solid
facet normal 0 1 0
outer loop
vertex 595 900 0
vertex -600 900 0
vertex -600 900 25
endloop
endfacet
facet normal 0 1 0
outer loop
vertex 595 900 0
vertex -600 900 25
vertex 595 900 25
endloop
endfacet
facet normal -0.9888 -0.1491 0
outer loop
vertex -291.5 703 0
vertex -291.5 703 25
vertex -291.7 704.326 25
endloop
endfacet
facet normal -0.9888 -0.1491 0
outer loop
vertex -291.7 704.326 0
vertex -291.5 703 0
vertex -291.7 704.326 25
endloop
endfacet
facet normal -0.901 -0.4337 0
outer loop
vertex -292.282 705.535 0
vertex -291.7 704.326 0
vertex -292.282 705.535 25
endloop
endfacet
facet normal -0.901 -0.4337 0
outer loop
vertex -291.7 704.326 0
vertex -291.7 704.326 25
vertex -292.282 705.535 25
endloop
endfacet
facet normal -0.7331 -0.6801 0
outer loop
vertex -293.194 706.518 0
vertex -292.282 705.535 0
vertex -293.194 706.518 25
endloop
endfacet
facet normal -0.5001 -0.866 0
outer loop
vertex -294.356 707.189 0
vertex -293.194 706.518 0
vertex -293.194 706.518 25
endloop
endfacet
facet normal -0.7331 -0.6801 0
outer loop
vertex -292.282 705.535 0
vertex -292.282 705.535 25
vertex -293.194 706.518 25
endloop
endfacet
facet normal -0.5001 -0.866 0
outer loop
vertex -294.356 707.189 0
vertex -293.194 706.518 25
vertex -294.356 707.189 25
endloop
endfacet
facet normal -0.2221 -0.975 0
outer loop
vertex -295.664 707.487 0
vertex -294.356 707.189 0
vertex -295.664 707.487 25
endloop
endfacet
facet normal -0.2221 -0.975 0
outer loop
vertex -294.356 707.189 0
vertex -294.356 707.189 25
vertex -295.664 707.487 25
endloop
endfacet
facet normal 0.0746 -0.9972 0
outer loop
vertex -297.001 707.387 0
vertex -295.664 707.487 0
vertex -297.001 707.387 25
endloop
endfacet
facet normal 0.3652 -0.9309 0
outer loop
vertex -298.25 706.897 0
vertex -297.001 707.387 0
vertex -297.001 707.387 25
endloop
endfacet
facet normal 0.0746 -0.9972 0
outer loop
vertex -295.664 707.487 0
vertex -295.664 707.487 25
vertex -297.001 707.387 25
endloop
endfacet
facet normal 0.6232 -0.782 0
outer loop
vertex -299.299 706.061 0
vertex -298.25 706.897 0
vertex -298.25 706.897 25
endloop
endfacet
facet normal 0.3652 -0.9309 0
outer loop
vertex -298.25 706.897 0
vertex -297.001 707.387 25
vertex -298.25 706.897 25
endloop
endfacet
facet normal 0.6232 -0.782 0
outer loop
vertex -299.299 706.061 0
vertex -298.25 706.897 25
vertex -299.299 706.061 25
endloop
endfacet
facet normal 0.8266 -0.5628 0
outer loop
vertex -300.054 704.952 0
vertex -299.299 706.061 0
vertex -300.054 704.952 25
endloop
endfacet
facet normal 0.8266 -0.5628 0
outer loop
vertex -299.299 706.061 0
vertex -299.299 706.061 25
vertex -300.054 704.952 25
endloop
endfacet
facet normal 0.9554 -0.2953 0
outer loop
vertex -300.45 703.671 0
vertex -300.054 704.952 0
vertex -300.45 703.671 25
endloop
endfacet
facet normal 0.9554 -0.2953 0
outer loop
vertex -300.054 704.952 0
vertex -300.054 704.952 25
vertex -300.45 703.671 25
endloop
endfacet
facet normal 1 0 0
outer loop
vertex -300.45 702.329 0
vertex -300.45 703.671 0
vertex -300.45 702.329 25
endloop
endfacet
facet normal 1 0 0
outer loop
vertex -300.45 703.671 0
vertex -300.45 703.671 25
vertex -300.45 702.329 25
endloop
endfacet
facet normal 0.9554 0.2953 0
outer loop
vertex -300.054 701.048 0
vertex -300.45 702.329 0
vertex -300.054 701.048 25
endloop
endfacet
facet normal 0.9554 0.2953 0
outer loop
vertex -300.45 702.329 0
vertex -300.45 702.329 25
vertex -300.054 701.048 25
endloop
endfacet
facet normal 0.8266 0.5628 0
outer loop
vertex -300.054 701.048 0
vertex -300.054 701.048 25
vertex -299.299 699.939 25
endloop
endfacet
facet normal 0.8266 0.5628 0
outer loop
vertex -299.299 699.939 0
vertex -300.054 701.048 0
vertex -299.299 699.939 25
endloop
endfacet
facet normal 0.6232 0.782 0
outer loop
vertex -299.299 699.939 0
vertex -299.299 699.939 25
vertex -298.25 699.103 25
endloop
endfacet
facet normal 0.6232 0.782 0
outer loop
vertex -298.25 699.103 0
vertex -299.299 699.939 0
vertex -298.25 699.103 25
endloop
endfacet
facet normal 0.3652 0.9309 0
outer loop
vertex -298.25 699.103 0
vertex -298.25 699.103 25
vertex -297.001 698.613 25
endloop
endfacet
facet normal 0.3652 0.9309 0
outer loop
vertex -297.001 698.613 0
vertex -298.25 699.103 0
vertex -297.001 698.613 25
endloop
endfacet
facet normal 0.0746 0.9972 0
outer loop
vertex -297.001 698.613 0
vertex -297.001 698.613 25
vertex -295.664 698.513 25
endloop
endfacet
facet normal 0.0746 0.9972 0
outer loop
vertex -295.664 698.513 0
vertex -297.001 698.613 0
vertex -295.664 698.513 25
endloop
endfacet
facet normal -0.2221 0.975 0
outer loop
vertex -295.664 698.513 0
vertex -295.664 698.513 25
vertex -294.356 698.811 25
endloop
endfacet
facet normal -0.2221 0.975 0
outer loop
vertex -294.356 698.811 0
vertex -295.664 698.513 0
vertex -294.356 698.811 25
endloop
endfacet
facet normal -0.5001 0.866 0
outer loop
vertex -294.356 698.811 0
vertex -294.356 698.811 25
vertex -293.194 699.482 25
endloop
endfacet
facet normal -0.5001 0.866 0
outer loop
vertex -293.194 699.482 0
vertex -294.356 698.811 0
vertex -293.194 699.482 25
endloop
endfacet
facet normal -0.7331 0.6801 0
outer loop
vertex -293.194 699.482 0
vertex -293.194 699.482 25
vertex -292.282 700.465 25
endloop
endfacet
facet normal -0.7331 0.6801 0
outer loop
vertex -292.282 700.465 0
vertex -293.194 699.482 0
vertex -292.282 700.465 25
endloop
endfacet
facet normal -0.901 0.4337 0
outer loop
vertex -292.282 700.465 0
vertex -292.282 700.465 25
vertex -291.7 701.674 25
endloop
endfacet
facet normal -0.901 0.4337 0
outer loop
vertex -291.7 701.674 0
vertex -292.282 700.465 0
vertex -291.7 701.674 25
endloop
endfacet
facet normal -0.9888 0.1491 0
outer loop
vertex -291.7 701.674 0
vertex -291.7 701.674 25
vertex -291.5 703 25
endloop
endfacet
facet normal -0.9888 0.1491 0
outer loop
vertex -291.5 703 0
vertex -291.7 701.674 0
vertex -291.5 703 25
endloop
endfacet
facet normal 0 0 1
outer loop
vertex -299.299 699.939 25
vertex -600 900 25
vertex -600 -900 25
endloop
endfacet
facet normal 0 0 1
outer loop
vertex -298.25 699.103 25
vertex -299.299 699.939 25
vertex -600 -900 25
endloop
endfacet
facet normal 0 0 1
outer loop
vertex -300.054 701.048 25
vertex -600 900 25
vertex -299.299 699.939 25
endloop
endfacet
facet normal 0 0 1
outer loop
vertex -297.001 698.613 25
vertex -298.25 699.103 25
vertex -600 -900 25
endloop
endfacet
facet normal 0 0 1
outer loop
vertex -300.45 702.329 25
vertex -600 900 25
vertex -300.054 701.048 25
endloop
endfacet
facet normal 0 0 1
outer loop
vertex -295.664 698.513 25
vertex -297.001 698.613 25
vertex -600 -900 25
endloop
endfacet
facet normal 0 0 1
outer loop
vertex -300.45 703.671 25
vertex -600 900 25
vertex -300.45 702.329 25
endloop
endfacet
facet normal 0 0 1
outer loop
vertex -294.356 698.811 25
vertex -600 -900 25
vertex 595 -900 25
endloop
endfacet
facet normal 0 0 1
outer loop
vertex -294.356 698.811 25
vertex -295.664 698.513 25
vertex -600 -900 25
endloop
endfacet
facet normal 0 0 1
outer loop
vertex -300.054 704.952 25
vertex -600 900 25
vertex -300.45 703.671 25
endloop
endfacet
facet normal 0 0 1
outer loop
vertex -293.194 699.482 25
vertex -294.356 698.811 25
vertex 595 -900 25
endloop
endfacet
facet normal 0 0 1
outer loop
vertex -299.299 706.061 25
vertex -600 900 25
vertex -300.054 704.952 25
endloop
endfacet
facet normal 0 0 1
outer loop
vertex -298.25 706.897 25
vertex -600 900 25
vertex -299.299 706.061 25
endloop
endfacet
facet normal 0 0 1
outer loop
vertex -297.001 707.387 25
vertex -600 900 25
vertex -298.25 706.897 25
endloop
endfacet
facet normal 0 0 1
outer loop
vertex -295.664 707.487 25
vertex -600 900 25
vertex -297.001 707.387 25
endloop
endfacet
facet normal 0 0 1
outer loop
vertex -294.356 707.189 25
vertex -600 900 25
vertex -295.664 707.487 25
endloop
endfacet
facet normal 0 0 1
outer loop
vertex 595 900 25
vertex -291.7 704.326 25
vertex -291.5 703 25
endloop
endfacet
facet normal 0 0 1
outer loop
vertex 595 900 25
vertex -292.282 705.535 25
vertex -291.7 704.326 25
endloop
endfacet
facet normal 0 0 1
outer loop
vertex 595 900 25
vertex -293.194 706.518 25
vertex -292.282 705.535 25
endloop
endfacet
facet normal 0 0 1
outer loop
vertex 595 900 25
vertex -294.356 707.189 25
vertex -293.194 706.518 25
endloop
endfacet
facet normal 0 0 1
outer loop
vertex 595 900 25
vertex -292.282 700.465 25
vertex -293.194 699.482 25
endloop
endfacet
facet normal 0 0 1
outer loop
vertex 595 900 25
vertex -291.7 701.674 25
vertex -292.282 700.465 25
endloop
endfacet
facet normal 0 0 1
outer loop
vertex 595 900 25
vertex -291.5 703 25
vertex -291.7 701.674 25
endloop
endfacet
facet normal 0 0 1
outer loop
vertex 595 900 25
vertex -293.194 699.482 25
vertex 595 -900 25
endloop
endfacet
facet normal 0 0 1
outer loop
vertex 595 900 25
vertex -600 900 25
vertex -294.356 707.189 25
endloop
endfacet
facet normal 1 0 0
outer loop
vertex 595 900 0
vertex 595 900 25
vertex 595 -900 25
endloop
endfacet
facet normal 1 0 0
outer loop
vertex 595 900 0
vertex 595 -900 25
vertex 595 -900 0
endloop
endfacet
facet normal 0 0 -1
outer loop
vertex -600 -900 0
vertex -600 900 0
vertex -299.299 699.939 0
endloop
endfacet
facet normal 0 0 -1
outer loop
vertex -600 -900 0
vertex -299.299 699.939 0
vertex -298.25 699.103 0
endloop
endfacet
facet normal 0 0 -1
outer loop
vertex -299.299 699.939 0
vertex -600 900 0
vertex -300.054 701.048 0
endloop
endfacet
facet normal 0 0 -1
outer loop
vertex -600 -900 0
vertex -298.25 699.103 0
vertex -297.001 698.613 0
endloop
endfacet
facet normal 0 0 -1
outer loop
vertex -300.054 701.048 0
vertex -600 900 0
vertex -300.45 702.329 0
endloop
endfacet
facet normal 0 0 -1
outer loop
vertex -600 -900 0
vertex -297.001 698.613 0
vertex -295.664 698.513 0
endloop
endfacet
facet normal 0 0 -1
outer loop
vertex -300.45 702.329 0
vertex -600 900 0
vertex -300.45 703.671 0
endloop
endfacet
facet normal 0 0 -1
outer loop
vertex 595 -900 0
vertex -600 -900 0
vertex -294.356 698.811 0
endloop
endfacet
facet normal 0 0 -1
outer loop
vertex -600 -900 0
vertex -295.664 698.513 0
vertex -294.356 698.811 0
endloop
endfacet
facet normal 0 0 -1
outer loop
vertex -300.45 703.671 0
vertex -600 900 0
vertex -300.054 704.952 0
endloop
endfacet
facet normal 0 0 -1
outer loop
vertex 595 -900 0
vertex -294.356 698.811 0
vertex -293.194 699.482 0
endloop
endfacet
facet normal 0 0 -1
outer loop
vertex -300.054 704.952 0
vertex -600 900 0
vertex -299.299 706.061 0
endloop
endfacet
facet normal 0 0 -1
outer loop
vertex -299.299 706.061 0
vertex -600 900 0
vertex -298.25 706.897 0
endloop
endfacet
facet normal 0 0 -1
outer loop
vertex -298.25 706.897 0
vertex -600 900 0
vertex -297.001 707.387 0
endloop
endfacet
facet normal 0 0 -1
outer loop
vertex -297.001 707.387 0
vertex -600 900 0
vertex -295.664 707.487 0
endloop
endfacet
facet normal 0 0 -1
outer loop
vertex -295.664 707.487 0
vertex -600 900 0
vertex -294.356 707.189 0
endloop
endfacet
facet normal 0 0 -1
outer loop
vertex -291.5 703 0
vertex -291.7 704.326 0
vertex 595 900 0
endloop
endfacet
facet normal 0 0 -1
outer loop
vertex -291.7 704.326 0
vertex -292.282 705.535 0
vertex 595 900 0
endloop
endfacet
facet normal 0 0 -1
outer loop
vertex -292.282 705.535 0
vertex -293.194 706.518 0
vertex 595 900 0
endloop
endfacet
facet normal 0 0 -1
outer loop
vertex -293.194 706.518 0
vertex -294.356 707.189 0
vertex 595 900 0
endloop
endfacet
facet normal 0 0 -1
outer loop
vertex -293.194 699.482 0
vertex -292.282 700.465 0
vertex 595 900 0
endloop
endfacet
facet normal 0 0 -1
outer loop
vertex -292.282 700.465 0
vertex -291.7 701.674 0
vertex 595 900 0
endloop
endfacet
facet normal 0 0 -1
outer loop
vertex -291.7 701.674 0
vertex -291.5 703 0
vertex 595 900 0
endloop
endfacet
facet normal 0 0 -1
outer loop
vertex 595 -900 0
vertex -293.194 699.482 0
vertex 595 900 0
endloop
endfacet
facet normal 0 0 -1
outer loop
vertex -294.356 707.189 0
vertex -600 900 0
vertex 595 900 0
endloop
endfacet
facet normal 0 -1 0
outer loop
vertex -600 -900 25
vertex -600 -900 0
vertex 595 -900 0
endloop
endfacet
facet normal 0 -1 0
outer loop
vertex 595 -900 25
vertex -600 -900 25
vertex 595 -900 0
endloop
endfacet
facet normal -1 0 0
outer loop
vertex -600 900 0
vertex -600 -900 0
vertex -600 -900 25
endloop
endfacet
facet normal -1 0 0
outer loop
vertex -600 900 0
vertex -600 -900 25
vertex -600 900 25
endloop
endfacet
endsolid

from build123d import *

# Parameters (mm, degrees)
SKETCH1_W           = 1200
SKETCH1_H           = 1800
BOSS_EXTRUDE1_DEPTH = 25
SKETCH2_R           = 4.5
CUT_EXTRUDE1_DEPTH  = 1082.954250419
SKETCH5_W           = 1918.317886643
SKETCH5_H           = 2614.541366737
CUT_EXTRUDE2_DEPTH  = 5


with BuildPart() as part:
    # Sketch1 → Boss-Extrude1 (new body)
    with BuildSketch(Plane.XY):
        Rectangle(SKETCH1_W, SKETCH1_H)
    extrude(amount=BOSS_EXTRUDE1_DEPTH)

    # Sketch2 → Cut-Extrude1 (cut, through all)
    with BuildSketch(Plane.XY.offset(25)):
        with Locations((-296, 703)):
            Circle(SKETCH2_R)
    extrude(amount=-CUT_EXTRUDE1_DEPTH, mode=Mode.SUBTRACT)

    # Sketch5 → Cut-Extrude2 (cut)
    with BuildSketch(Plane(origin=(600, 0, 0), x_dir=(0, 0, -1), z_dir=(1, 0, 0))):
        with Locations((50.456378519, -72.831888875)):
            Rectangle(SKETCH5_W, SKETCH5_H)
    extrude(amount=-CUT_EXTRUDE2_DEPTH, mode=Mode.SUBTRACT)


solid = part.part
